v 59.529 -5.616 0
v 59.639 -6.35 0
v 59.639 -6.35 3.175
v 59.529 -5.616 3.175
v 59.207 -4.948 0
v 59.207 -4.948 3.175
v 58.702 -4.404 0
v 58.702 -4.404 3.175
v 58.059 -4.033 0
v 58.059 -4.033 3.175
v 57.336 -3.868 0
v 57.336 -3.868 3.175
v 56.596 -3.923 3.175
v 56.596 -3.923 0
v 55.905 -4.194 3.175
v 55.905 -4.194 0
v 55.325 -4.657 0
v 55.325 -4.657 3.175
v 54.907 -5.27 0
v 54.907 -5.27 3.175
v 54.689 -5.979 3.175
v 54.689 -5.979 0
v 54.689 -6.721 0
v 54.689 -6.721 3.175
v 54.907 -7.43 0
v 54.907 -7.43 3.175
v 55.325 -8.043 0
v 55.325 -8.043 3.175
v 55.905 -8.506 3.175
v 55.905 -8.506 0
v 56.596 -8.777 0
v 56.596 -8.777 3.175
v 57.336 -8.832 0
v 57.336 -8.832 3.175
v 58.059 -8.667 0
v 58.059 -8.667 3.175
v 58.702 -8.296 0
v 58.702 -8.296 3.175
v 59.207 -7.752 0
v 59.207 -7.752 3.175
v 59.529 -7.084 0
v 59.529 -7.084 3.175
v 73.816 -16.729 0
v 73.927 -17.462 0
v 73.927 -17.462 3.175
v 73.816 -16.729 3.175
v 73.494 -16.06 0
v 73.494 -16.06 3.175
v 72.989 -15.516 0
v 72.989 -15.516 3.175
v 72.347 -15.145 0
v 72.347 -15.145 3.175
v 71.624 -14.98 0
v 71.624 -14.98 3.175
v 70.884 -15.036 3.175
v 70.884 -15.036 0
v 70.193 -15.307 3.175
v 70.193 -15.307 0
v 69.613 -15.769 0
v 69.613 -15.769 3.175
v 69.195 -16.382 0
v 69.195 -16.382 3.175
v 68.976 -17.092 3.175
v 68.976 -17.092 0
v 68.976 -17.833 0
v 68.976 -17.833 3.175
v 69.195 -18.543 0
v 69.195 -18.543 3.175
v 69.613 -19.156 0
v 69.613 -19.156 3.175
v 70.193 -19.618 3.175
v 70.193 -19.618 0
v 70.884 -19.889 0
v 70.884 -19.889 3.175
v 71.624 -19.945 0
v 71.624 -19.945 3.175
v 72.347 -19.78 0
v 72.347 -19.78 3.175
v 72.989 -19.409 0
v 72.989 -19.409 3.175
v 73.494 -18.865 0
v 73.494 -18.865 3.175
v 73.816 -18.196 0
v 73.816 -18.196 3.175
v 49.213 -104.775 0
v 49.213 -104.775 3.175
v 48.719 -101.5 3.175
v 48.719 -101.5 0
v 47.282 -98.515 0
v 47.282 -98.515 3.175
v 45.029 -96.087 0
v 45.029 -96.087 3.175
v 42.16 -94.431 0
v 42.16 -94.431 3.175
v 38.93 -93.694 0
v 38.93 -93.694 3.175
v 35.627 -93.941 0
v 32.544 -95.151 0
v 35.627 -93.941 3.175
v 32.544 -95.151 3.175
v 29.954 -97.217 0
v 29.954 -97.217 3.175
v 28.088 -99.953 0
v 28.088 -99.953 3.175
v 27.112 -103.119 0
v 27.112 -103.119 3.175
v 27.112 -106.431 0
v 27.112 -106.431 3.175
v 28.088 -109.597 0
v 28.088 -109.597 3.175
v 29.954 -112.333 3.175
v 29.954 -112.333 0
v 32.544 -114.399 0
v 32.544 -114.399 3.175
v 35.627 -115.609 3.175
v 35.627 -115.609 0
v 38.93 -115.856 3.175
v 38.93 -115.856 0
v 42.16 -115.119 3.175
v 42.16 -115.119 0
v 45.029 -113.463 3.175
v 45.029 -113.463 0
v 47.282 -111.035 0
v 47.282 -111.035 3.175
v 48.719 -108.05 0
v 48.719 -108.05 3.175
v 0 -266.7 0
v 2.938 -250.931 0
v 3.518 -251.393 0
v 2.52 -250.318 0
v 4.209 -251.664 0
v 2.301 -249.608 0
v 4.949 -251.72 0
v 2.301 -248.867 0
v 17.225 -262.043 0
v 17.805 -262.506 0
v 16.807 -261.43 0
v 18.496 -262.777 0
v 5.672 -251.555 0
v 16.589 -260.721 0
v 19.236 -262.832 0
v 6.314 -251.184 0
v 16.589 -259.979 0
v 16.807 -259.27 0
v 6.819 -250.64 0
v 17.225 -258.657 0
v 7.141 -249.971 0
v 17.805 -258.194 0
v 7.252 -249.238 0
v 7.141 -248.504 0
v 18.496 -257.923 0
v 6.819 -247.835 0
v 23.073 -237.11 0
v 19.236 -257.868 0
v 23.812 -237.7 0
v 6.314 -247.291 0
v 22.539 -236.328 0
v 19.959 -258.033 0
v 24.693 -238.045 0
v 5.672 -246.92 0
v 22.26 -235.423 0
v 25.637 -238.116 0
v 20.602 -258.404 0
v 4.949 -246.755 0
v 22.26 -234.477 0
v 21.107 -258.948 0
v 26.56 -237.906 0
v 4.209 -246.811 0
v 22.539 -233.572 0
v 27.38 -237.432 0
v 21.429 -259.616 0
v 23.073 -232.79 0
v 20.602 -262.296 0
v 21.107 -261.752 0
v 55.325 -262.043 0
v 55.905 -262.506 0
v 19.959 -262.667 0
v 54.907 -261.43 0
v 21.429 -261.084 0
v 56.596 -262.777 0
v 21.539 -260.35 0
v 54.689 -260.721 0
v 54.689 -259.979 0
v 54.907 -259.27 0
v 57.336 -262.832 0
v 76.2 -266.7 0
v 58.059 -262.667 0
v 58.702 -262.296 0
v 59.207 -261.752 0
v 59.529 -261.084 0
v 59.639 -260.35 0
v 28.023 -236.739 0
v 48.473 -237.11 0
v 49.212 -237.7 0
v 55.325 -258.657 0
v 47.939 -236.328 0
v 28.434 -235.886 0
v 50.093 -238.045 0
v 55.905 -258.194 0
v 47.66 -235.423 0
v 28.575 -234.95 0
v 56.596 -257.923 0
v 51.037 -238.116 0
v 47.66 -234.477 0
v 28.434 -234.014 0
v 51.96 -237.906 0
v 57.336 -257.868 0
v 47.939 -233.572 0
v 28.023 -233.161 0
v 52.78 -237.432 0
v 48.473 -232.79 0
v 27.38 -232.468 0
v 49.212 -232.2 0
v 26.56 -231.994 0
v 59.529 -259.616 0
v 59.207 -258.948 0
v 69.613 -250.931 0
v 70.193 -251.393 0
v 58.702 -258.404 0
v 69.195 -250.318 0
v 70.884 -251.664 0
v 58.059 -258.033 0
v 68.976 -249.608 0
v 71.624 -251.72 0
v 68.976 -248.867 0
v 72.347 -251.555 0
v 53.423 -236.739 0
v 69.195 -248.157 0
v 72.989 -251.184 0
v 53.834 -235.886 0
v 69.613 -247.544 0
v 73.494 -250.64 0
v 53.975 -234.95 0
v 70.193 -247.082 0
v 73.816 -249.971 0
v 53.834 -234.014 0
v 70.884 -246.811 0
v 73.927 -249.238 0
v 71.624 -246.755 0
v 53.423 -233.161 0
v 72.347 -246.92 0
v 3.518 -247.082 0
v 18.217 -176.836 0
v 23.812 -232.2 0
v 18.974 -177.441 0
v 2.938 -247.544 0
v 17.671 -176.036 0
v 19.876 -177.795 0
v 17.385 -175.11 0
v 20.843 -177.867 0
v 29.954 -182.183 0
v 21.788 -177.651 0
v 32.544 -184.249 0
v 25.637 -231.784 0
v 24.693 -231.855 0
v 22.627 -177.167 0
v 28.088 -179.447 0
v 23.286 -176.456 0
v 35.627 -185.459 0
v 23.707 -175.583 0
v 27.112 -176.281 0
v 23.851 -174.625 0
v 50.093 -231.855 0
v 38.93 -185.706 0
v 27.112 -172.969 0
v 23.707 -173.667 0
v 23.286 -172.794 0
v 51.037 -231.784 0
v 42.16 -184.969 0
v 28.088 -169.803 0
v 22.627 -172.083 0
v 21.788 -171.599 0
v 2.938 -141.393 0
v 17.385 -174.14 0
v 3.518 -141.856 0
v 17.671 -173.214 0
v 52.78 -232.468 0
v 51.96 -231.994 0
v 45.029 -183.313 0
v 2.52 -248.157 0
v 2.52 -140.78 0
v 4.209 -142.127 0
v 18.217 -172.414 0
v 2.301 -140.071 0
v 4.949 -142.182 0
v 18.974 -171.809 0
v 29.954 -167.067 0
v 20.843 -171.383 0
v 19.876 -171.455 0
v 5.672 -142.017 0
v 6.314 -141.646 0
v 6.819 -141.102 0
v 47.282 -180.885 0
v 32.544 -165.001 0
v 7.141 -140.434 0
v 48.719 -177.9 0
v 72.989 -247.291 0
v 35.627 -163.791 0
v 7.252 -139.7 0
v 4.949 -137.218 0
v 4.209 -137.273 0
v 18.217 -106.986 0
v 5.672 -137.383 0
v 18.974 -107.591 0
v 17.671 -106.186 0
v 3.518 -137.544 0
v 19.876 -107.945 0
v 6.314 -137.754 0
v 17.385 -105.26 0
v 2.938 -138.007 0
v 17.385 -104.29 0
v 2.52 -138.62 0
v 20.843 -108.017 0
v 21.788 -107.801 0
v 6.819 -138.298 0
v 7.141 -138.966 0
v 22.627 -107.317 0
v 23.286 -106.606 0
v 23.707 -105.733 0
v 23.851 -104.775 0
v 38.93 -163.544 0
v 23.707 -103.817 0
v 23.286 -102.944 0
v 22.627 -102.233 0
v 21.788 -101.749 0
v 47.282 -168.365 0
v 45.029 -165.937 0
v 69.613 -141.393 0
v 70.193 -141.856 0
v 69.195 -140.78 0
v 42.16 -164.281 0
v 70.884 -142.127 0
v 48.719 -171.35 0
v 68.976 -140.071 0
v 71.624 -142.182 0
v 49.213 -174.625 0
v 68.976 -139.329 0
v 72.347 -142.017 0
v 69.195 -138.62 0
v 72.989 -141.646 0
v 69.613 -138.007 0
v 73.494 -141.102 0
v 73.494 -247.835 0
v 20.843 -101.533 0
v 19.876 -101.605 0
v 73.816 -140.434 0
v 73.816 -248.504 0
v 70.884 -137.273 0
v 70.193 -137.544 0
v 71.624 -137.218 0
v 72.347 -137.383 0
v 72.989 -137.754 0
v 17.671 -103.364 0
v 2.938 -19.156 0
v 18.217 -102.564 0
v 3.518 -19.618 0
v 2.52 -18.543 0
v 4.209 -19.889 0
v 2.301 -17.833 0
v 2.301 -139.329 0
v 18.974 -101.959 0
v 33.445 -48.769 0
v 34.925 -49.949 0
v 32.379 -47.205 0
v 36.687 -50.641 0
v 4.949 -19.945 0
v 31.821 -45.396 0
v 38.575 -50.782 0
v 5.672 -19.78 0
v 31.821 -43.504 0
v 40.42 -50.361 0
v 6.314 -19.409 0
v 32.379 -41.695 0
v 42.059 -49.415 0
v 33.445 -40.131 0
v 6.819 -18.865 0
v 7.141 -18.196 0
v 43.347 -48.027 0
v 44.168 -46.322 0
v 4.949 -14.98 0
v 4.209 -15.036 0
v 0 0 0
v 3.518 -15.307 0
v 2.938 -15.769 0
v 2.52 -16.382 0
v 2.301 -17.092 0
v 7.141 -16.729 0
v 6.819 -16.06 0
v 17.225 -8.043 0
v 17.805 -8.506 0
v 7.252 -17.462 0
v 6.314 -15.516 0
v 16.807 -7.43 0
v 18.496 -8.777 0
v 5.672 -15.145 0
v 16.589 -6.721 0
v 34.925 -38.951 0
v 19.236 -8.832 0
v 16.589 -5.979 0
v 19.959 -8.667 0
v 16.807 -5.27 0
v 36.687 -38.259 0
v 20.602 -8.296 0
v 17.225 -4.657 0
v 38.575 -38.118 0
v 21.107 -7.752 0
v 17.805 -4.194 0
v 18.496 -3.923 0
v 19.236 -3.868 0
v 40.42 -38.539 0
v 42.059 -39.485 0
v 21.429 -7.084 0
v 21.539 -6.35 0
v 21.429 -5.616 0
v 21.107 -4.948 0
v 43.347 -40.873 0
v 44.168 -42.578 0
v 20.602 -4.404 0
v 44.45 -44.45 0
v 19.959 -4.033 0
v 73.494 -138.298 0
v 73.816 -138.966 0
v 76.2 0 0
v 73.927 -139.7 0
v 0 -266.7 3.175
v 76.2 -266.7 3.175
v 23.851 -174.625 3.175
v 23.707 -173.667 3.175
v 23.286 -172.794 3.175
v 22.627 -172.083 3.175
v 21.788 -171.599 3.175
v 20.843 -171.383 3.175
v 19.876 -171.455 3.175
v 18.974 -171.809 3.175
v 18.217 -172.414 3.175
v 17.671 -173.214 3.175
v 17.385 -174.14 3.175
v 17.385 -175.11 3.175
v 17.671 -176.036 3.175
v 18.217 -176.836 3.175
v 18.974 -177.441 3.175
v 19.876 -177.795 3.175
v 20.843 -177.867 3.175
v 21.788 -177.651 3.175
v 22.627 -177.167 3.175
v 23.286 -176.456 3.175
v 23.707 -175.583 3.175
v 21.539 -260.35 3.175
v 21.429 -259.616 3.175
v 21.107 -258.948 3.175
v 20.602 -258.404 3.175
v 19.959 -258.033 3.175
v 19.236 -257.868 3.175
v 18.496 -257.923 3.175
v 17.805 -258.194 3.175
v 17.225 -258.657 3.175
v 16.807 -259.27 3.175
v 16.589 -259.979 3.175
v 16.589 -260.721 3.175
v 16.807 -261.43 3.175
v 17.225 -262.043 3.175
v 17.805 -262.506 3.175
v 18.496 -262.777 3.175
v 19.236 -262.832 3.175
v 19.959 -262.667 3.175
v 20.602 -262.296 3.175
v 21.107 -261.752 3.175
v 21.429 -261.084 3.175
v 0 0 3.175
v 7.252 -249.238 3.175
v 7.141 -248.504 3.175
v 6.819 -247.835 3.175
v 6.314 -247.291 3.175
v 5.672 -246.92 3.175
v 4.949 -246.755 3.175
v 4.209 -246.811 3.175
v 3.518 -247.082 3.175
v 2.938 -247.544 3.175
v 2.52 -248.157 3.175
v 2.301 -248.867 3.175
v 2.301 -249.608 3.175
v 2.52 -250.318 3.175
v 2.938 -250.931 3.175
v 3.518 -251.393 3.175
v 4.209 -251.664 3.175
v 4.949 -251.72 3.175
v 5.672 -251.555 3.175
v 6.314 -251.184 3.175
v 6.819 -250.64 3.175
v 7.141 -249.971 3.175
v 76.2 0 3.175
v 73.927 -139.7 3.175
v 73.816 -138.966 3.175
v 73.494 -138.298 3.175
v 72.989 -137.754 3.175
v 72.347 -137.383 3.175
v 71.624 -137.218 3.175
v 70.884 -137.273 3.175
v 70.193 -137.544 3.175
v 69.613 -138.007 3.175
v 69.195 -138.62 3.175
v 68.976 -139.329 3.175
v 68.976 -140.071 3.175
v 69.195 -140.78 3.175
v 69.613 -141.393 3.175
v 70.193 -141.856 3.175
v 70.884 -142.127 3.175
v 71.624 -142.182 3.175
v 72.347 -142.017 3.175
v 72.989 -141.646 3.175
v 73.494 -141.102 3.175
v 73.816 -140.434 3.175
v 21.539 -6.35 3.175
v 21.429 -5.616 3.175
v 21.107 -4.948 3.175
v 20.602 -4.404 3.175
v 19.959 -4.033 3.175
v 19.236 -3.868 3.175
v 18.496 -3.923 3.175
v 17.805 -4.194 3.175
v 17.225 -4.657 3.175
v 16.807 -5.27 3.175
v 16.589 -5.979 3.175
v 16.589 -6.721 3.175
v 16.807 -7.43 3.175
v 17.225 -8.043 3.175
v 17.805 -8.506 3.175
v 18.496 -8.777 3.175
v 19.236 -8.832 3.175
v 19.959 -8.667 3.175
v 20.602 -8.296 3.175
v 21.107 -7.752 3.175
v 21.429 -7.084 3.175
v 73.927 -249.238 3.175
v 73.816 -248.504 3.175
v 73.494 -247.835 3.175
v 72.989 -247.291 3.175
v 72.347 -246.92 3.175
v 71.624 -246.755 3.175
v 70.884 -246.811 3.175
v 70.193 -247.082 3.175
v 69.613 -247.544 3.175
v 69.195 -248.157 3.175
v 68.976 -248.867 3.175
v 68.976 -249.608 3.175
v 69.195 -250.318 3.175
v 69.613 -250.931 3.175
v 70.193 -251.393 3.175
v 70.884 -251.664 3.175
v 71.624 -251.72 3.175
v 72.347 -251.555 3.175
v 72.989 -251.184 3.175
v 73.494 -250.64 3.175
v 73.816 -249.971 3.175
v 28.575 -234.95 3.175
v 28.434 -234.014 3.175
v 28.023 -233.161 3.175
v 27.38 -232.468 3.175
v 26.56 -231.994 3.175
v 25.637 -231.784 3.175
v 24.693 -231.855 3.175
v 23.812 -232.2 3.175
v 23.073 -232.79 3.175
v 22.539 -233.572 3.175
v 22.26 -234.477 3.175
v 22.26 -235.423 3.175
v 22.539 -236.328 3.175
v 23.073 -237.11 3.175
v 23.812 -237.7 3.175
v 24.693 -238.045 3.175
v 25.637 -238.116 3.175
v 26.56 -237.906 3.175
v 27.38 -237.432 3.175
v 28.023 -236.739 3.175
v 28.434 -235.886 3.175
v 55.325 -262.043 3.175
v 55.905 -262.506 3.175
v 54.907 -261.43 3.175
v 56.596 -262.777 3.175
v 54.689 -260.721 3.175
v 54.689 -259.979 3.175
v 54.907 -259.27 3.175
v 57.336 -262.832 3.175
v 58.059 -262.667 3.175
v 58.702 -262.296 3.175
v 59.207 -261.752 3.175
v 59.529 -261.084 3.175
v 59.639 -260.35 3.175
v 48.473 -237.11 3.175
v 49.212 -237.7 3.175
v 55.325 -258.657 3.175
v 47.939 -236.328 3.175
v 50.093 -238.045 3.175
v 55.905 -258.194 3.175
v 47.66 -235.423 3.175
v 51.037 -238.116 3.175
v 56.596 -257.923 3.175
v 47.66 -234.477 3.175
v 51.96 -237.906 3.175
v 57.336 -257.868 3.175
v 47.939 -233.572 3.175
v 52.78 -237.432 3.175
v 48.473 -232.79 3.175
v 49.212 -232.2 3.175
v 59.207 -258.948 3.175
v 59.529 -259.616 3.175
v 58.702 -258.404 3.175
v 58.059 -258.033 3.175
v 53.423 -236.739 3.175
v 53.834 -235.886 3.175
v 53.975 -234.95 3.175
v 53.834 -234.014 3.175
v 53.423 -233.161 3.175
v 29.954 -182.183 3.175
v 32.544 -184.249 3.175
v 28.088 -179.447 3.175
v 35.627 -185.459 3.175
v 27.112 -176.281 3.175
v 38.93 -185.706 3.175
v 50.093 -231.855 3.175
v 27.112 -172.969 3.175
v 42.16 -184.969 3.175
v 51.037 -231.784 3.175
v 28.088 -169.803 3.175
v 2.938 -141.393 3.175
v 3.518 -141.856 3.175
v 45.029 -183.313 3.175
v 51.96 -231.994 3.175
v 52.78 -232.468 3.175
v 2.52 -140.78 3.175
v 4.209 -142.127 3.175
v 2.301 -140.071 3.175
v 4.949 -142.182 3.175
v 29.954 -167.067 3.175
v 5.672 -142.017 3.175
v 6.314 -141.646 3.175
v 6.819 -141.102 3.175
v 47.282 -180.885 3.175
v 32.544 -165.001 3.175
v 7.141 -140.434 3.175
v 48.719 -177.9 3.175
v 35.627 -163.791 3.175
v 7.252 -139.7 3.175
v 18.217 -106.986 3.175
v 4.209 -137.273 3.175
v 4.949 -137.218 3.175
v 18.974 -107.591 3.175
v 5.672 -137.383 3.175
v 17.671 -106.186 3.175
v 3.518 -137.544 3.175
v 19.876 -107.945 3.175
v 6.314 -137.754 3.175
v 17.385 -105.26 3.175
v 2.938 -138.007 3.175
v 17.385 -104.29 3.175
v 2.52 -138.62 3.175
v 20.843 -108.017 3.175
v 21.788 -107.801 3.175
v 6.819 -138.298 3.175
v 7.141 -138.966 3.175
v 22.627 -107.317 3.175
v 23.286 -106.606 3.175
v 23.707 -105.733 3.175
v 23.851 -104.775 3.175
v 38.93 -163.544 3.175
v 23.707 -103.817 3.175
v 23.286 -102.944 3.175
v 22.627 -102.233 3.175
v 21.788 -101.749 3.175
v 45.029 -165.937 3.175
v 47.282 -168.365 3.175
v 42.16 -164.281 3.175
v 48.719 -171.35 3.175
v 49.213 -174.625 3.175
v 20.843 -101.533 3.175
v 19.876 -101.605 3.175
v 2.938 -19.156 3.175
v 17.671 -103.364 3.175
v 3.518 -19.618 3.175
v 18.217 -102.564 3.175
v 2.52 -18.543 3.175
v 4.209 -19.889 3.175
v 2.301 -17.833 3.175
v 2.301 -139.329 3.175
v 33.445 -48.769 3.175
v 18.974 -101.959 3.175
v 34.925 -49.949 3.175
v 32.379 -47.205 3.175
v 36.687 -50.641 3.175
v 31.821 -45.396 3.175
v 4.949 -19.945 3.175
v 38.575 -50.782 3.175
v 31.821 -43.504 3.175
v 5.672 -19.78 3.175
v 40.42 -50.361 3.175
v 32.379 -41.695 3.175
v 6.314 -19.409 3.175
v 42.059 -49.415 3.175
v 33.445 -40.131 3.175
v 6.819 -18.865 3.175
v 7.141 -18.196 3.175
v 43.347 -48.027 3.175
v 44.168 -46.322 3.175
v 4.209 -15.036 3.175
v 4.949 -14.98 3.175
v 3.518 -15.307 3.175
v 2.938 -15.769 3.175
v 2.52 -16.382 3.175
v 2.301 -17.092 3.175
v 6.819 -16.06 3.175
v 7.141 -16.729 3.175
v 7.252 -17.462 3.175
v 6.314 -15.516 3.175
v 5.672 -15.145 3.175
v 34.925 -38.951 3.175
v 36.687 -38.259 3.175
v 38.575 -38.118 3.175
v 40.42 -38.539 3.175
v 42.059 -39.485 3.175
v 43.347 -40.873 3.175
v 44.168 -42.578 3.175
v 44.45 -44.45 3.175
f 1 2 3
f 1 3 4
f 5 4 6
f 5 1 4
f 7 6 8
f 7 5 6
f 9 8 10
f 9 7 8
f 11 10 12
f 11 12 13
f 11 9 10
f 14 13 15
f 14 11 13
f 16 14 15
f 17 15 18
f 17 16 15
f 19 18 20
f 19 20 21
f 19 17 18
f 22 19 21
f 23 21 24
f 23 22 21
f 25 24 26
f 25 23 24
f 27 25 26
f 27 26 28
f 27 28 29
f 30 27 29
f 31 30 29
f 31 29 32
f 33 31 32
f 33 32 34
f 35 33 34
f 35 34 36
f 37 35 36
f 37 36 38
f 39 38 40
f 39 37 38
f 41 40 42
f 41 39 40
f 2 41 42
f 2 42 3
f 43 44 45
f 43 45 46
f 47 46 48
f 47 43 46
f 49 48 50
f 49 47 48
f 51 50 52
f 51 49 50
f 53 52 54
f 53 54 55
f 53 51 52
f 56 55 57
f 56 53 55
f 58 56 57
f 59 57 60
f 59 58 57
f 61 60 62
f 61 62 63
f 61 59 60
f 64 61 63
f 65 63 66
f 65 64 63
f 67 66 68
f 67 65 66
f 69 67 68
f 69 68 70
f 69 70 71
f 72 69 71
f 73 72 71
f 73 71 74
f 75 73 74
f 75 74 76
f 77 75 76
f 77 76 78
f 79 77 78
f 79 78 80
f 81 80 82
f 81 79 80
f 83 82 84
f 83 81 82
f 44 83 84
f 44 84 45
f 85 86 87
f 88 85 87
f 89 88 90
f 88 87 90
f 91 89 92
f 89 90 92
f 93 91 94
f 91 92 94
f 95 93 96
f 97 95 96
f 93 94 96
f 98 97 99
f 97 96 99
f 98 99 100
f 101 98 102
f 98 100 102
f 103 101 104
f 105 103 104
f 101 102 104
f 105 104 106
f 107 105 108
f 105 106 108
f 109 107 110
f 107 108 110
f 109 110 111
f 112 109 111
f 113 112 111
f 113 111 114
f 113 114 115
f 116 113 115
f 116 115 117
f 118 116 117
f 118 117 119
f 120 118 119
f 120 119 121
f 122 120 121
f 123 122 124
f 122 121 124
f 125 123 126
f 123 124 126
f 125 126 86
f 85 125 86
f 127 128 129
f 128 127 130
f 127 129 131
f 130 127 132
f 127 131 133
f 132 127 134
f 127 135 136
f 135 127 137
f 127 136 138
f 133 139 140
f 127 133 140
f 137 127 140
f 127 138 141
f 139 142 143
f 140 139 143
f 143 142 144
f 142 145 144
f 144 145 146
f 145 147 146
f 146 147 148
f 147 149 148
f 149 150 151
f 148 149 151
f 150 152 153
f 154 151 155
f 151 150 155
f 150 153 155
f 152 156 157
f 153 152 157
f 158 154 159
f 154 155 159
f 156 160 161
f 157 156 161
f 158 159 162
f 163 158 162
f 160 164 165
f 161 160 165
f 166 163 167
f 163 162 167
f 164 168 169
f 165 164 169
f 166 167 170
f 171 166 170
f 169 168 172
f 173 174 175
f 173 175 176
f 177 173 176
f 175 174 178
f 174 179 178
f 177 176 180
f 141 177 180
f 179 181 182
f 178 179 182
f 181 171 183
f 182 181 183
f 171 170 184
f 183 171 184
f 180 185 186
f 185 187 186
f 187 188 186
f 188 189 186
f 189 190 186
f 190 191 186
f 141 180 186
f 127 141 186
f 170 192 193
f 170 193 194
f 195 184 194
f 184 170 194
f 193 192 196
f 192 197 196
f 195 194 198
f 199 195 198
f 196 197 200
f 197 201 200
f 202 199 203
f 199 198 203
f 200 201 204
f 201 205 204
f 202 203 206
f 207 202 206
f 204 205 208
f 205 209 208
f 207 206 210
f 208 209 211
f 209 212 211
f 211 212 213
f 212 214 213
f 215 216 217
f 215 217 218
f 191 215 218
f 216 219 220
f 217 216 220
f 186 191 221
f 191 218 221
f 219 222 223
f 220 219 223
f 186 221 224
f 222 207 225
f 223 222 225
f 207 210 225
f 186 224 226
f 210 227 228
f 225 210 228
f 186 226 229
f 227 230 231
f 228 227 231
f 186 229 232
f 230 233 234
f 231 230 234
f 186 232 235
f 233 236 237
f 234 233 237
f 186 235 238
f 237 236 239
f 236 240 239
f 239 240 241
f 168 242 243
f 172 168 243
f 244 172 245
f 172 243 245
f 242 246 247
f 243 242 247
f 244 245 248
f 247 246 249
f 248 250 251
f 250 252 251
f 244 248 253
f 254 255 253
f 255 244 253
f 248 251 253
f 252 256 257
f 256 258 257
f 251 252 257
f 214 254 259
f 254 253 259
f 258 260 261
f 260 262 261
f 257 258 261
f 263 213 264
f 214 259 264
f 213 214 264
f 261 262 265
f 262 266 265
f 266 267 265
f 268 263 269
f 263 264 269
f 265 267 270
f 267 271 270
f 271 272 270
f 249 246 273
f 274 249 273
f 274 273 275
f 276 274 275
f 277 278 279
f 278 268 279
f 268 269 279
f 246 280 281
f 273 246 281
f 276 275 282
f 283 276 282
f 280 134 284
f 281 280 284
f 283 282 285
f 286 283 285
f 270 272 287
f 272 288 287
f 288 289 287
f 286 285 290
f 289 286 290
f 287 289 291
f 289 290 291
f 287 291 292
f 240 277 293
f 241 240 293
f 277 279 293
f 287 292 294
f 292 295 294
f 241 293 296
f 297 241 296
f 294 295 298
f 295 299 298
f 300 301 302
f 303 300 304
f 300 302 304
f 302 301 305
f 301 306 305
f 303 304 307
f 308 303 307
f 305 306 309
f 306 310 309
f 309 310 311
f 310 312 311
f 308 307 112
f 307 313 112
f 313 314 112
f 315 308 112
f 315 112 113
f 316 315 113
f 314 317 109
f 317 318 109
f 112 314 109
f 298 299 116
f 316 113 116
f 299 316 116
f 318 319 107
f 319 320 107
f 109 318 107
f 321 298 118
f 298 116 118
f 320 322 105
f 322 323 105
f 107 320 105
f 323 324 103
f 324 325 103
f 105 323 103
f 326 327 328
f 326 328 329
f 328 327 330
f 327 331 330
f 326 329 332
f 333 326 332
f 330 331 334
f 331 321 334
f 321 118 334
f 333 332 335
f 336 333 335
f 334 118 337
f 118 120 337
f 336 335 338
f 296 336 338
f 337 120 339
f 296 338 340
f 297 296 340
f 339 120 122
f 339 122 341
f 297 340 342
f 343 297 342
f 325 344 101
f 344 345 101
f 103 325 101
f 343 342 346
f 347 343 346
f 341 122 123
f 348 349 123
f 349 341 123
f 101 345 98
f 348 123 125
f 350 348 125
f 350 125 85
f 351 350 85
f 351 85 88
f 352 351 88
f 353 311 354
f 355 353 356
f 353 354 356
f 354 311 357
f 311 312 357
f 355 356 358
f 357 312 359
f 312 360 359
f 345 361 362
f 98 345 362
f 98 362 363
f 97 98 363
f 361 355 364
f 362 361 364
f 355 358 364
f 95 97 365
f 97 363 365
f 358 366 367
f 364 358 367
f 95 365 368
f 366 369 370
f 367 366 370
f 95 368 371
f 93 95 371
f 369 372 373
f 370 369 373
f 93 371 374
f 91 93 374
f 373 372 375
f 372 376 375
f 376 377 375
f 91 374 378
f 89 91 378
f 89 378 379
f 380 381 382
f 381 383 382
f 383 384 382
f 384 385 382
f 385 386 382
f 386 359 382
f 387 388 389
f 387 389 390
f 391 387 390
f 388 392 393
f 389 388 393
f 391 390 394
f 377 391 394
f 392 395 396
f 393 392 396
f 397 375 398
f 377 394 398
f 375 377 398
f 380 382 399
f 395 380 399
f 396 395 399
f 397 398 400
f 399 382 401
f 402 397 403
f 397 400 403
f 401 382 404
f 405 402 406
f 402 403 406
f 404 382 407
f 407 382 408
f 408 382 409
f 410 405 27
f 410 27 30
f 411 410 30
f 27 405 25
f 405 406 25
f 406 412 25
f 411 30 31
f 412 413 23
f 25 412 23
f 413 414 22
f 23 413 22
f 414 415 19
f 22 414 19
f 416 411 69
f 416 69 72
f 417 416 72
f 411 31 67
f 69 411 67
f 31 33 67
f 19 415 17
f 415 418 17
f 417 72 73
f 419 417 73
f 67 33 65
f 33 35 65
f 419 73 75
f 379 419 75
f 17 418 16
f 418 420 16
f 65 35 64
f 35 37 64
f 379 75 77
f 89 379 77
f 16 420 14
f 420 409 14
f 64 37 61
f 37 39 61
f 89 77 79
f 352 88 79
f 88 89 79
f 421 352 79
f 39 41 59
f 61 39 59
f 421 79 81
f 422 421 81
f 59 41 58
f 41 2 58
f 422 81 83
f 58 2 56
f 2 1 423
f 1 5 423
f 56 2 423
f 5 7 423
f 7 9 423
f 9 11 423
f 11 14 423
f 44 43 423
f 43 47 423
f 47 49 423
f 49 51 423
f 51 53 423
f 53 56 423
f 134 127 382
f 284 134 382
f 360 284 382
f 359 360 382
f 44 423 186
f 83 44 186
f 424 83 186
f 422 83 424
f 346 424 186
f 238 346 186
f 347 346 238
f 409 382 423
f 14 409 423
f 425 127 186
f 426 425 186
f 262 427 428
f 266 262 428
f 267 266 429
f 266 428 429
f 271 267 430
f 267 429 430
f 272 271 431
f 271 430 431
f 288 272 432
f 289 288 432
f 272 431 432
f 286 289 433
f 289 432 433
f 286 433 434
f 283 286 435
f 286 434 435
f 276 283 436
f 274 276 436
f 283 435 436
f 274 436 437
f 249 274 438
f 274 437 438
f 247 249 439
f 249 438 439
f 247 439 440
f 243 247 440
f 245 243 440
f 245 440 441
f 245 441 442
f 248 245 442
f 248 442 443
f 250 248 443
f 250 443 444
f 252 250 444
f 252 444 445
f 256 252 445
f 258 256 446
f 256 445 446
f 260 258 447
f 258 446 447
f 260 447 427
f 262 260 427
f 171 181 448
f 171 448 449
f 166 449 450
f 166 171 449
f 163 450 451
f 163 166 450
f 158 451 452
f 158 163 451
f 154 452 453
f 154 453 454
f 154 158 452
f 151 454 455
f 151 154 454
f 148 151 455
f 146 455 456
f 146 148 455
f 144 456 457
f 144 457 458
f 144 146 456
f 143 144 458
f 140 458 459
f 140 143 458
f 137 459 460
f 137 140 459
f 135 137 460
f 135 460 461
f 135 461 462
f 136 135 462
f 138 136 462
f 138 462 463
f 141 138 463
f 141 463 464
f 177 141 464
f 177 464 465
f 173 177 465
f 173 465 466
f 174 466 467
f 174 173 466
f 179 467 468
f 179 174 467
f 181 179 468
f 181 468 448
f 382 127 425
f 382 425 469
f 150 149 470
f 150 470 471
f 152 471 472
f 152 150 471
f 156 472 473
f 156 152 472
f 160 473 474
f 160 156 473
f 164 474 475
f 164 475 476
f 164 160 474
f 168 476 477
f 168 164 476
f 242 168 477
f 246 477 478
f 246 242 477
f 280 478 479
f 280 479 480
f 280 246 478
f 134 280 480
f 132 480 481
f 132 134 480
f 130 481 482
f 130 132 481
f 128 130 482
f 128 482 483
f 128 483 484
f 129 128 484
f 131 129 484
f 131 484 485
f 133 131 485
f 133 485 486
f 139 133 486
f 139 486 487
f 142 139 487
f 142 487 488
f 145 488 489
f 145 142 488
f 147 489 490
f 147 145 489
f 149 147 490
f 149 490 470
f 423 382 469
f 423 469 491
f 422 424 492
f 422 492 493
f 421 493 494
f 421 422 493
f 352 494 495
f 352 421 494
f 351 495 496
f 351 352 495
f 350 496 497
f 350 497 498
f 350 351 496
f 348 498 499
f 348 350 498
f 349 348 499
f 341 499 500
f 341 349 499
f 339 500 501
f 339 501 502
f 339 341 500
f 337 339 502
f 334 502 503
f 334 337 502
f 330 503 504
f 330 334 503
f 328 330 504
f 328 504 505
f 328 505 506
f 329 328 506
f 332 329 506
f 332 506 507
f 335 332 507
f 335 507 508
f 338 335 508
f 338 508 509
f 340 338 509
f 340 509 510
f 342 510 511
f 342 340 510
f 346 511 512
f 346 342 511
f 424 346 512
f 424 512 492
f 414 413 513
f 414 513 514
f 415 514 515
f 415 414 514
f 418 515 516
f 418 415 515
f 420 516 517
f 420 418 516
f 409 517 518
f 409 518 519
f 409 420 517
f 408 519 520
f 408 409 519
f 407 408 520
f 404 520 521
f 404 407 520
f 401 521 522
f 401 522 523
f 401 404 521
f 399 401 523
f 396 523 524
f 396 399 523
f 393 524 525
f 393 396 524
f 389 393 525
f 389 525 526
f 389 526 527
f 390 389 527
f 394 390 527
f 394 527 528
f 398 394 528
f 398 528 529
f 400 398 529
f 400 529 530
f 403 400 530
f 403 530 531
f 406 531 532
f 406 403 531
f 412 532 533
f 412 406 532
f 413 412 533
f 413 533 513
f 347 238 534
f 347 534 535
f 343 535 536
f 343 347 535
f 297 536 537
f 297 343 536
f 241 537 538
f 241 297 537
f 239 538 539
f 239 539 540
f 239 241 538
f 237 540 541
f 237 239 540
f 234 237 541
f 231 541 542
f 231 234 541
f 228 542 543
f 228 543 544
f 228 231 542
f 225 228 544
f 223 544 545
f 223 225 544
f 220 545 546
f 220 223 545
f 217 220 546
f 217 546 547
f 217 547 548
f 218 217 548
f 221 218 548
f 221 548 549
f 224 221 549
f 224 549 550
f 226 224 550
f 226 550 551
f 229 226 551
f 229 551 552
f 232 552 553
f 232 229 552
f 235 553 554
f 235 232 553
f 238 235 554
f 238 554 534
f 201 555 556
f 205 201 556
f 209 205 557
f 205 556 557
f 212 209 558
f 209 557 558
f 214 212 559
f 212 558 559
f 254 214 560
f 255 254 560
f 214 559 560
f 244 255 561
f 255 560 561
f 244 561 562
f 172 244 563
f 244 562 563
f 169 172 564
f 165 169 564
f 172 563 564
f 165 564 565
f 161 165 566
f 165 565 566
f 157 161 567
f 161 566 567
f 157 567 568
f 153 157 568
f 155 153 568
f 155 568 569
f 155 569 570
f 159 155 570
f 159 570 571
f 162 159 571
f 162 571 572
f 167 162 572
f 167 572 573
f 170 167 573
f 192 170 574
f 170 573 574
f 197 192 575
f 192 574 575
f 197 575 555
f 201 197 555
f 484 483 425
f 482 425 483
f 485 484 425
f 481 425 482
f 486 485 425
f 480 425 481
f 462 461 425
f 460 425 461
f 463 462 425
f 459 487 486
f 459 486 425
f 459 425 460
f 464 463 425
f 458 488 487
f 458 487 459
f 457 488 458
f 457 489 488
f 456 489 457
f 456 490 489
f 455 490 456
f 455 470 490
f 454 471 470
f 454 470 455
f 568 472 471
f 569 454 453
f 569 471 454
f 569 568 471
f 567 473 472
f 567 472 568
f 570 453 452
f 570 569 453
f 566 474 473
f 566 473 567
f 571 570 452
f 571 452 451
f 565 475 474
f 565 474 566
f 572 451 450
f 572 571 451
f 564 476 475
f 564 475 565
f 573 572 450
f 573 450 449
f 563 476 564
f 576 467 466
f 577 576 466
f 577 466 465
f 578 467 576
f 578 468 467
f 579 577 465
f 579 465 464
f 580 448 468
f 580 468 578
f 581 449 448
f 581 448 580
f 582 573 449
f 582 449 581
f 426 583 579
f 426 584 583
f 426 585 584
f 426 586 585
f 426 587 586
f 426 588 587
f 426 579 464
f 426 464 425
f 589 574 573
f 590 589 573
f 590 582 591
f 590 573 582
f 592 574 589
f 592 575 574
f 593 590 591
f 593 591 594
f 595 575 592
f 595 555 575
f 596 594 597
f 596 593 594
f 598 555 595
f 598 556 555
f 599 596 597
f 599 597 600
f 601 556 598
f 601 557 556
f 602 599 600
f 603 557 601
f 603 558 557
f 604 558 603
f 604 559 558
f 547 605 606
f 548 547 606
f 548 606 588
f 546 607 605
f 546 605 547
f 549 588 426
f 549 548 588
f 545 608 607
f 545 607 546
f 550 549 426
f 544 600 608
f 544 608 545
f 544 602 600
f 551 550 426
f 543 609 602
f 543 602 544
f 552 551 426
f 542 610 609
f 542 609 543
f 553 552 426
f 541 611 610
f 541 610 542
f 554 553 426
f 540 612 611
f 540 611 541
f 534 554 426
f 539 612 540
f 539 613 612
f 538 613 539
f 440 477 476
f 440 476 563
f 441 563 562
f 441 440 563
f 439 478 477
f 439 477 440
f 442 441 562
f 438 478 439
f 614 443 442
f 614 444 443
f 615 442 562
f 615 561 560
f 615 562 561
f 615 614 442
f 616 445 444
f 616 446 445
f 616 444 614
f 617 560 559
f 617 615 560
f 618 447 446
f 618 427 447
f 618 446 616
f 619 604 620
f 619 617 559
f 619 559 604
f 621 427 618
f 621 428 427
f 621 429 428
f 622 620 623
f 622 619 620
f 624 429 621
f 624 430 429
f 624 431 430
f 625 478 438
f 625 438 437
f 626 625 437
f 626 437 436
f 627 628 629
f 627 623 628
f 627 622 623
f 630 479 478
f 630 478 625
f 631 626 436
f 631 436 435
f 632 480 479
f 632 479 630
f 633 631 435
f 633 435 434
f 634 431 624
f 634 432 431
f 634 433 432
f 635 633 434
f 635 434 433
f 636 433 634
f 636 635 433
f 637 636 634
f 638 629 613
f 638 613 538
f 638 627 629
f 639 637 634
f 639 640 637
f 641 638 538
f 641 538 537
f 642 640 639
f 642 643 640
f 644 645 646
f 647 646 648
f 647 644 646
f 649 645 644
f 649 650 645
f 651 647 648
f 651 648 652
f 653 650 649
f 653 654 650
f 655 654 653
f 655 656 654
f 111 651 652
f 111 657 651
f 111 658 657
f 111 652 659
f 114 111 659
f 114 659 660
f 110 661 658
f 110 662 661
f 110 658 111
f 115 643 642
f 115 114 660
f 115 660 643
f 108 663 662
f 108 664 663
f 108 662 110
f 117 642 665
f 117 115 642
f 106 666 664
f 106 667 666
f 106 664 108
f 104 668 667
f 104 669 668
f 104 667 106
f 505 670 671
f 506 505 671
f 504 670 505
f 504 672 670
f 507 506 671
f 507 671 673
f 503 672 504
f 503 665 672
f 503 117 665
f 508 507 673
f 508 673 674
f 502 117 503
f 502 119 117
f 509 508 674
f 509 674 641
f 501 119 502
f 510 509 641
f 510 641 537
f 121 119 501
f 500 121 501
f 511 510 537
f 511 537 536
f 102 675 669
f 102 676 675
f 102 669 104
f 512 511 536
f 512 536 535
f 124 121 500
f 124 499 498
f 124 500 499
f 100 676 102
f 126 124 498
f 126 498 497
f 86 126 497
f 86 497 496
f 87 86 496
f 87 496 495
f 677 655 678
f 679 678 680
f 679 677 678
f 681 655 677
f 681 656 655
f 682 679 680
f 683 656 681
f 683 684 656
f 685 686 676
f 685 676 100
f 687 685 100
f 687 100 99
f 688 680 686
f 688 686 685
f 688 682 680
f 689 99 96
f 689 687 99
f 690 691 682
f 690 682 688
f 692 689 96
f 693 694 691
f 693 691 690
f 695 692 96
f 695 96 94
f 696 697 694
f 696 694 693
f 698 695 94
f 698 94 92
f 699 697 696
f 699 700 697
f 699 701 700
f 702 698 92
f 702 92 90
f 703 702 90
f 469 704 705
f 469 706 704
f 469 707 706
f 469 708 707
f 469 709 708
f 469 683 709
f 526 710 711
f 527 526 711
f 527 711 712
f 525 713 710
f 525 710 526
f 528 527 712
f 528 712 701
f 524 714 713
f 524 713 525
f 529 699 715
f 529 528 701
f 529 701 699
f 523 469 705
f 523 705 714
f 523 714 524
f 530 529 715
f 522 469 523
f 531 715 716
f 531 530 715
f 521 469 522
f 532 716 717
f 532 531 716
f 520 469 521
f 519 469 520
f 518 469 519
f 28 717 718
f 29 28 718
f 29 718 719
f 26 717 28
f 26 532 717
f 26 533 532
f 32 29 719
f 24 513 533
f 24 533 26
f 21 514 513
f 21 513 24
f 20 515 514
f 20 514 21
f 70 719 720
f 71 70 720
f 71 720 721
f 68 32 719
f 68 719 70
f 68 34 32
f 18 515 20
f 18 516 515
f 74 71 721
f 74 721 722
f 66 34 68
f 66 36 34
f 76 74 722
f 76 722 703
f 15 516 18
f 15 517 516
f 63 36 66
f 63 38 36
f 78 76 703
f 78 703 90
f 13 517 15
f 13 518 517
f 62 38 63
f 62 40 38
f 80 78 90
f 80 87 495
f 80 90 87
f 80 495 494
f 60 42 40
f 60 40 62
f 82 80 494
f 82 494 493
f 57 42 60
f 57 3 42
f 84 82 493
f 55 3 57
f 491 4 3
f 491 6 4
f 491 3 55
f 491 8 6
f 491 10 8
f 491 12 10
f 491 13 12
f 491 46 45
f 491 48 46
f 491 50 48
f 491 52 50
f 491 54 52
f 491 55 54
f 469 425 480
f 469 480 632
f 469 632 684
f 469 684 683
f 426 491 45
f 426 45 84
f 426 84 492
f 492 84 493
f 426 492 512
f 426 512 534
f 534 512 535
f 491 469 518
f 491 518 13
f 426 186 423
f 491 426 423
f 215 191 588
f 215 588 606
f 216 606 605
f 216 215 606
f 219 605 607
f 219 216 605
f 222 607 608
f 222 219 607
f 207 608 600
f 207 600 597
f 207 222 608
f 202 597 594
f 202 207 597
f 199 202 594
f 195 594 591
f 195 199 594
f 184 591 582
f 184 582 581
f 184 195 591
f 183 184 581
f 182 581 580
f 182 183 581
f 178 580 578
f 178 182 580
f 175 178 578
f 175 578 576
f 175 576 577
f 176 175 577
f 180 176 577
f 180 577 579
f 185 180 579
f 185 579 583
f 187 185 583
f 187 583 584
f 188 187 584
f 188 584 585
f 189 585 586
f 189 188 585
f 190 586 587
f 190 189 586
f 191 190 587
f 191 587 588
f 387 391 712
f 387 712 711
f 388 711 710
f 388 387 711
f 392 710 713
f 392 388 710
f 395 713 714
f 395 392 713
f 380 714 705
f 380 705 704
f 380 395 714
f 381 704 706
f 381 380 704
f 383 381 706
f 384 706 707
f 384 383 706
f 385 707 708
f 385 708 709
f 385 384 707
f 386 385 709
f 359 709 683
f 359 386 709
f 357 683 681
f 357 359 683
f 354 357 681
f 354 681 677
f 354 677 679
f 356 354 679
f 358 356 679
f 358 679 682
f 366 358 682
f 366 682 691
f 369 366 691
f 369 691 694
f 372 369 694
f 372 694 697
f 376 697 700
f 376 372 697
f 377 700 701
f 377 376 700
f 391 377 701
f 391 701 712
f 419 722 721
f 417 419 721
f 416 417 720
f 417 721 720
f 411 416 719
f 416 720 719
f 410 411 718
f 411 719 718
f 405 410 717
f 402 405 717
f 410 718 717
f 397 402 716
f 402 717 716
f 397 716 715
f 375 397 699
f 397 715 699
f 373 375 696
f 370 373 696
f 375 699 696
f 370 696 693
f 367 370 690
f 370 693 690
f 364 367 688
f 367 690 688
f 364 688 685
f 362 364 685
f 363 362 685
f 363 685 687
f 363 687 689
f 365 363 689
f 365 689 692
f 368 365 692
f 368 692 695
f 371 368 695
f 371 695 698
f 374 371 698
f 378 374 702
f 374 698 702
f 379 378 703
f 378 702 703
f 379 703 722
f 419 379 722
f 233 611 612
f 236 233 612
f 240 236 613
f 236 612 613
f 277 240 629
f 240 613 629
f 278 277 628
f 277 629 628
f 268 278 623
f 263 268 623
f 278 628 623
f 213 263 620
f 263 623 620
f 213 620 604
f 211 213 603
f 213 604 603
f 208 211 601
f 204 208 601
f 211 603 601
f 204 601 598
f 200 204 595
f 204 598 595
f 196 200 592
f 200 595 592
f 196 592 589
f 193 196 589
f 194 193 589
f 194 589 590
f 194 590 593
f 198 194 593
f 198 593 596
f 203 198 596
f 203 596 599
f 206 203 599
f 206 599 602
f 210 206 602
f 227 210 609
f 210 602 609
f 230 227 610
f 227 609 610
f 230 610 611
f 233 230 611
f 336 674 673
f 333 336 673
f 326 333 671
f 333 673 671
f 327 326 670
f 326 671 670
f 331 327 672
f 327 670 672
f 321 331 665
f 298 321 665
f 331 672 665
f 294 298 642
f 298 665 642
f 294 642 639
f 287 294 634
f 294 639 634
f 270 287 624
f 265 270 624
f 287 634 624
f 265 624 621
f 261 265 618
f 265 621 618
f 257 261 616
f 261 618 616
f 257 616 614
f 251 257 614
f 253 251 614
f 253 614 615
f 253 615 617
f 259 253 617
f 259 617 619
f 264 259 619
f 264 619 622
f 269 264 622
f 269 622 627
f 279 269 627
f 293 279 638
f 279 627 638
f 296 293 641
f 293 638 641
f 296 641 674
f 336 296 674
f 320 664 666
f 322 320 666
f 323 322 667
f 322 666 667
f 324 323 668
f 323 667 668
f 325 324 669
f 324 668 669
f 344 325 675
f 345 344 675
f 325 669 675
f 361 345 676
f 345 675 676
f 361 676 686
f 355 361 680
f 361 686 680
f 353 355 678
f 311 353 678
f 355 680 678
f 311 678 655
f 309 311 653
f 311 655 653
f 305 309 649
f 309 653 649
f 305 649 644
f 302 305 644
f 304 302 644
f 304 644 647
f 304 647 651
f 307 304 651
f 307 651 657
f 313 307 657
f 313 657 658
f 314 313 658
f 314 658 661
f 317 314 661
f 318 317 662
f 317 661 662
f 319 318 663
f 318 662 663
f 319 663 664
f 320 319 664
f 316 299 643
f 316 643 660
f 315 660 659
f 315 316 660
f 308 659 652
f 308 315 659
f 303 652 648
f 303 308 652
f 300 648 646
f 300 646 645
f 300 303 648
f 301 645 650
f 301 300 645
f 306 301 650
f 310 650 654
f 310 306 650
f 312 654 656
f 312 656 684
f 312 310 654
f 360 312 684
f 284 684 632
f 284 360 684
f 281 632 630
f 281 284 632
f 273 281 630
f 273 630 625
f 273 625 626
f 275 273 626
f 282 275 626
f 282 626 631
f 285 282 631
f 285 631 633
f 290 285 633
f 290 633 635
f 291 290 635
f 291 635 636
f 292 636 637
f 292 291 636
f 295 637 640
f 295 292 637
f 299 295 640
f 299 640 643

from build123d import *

# Parameters (mm, degrees)
SKETCH1_W           = 76.2
SKETCH1_H           = 266.7
SKETCH1_R           = 2.4892
BOSS_EXTRUDE1_DEPTH = 3.175
SKETCH2_R           = 11.1125
SKETCH2_R_2         = 3.2512
SKETCH2_R_3         = 3.175
SKETCH2_R_4         = 6.35
CUT_EXTRUDE1_DEPTH  = 3.175


with BuildPart() as part:
    # Sketch1 → Boss-Extrude1 (new body)
    with BuildSketch(Plane.XY):
        with Locations((38.1, -133.35)):
            Rectangle(SKETCH1_W, SKETCH1_H)
        with Locations((19.05, -6.35)):
            Circle(SKETCH1_R, mode=Mode.SUBTRACT)
        with Locations((57.15, -6.35)):
            Circle(SKETCH1_R, mode=Mode.SUBTRACT)
        with Locations((71.4375, -17.4625)):
            Circle(SKETCH1_R, mode=Mode.SUBTRACT)
        with Locations((4.7625, -17.4625)):
            Circle(SKETCH1_R, mode=Mode.SUBTRACT)
        with Locations((71.4375, -139.7)):
            Circle(SKETCH1_R, mode=Mode.SUBTRACT)
        with Locations((4.7625, -139.7)):
            Circle(SKETCH1_R, mode=Mode.SUBTRACT)
        with Locations((71.4375, -249.2375)):
            Circle(SKETCH1_R, mode=Mode.SUBTRACT)
        with Locations((4.7625, -249.2375)):
            Circle(SKETCH1_R, mode=Mode.SUBTRACT)
        with Locations((19.05, -260.35)):
            Circle(SKETCH1_R, mode=Mode.SUBTRACT)
        with Locations((57.15, -260.35)):
            Circle(SKETCH1_R, mode=Mode.SUBTRACT)
    extrude(amount=BOSS_EXTRUDE1_DEPTH)

    # Sketch2 → Cut-Extrude1 (cut)
    with BuildSketch(Plane.XY.offset(3.175)):
        with Locations((38.1, -104.775)):
            Circle(SKETCH2_R)
        with Locations((38.1, -174.625)):
            Circle(SKETCH2_R)
        with Locations((20.599908, -174.625)):
            Circle(SKETCH2_R_2)
        with Locations((20.599908, -104.775)):
            Circle(SKETCH2_R_2)
        with Locations((25.4, -234.95)):
            Circle(SKETCH2_R_3)
        with Locations((50.8, -234.95)):
            Circle(SKETCH2_R_3)
        with Locations((38.1, -44.45)):
            Circle(SKETCH2_R_4)
    extrude(amount=-CUT_EXTRUDE1_DEPTH, mode=Mode.SUBTRACT)


solid = part.part
